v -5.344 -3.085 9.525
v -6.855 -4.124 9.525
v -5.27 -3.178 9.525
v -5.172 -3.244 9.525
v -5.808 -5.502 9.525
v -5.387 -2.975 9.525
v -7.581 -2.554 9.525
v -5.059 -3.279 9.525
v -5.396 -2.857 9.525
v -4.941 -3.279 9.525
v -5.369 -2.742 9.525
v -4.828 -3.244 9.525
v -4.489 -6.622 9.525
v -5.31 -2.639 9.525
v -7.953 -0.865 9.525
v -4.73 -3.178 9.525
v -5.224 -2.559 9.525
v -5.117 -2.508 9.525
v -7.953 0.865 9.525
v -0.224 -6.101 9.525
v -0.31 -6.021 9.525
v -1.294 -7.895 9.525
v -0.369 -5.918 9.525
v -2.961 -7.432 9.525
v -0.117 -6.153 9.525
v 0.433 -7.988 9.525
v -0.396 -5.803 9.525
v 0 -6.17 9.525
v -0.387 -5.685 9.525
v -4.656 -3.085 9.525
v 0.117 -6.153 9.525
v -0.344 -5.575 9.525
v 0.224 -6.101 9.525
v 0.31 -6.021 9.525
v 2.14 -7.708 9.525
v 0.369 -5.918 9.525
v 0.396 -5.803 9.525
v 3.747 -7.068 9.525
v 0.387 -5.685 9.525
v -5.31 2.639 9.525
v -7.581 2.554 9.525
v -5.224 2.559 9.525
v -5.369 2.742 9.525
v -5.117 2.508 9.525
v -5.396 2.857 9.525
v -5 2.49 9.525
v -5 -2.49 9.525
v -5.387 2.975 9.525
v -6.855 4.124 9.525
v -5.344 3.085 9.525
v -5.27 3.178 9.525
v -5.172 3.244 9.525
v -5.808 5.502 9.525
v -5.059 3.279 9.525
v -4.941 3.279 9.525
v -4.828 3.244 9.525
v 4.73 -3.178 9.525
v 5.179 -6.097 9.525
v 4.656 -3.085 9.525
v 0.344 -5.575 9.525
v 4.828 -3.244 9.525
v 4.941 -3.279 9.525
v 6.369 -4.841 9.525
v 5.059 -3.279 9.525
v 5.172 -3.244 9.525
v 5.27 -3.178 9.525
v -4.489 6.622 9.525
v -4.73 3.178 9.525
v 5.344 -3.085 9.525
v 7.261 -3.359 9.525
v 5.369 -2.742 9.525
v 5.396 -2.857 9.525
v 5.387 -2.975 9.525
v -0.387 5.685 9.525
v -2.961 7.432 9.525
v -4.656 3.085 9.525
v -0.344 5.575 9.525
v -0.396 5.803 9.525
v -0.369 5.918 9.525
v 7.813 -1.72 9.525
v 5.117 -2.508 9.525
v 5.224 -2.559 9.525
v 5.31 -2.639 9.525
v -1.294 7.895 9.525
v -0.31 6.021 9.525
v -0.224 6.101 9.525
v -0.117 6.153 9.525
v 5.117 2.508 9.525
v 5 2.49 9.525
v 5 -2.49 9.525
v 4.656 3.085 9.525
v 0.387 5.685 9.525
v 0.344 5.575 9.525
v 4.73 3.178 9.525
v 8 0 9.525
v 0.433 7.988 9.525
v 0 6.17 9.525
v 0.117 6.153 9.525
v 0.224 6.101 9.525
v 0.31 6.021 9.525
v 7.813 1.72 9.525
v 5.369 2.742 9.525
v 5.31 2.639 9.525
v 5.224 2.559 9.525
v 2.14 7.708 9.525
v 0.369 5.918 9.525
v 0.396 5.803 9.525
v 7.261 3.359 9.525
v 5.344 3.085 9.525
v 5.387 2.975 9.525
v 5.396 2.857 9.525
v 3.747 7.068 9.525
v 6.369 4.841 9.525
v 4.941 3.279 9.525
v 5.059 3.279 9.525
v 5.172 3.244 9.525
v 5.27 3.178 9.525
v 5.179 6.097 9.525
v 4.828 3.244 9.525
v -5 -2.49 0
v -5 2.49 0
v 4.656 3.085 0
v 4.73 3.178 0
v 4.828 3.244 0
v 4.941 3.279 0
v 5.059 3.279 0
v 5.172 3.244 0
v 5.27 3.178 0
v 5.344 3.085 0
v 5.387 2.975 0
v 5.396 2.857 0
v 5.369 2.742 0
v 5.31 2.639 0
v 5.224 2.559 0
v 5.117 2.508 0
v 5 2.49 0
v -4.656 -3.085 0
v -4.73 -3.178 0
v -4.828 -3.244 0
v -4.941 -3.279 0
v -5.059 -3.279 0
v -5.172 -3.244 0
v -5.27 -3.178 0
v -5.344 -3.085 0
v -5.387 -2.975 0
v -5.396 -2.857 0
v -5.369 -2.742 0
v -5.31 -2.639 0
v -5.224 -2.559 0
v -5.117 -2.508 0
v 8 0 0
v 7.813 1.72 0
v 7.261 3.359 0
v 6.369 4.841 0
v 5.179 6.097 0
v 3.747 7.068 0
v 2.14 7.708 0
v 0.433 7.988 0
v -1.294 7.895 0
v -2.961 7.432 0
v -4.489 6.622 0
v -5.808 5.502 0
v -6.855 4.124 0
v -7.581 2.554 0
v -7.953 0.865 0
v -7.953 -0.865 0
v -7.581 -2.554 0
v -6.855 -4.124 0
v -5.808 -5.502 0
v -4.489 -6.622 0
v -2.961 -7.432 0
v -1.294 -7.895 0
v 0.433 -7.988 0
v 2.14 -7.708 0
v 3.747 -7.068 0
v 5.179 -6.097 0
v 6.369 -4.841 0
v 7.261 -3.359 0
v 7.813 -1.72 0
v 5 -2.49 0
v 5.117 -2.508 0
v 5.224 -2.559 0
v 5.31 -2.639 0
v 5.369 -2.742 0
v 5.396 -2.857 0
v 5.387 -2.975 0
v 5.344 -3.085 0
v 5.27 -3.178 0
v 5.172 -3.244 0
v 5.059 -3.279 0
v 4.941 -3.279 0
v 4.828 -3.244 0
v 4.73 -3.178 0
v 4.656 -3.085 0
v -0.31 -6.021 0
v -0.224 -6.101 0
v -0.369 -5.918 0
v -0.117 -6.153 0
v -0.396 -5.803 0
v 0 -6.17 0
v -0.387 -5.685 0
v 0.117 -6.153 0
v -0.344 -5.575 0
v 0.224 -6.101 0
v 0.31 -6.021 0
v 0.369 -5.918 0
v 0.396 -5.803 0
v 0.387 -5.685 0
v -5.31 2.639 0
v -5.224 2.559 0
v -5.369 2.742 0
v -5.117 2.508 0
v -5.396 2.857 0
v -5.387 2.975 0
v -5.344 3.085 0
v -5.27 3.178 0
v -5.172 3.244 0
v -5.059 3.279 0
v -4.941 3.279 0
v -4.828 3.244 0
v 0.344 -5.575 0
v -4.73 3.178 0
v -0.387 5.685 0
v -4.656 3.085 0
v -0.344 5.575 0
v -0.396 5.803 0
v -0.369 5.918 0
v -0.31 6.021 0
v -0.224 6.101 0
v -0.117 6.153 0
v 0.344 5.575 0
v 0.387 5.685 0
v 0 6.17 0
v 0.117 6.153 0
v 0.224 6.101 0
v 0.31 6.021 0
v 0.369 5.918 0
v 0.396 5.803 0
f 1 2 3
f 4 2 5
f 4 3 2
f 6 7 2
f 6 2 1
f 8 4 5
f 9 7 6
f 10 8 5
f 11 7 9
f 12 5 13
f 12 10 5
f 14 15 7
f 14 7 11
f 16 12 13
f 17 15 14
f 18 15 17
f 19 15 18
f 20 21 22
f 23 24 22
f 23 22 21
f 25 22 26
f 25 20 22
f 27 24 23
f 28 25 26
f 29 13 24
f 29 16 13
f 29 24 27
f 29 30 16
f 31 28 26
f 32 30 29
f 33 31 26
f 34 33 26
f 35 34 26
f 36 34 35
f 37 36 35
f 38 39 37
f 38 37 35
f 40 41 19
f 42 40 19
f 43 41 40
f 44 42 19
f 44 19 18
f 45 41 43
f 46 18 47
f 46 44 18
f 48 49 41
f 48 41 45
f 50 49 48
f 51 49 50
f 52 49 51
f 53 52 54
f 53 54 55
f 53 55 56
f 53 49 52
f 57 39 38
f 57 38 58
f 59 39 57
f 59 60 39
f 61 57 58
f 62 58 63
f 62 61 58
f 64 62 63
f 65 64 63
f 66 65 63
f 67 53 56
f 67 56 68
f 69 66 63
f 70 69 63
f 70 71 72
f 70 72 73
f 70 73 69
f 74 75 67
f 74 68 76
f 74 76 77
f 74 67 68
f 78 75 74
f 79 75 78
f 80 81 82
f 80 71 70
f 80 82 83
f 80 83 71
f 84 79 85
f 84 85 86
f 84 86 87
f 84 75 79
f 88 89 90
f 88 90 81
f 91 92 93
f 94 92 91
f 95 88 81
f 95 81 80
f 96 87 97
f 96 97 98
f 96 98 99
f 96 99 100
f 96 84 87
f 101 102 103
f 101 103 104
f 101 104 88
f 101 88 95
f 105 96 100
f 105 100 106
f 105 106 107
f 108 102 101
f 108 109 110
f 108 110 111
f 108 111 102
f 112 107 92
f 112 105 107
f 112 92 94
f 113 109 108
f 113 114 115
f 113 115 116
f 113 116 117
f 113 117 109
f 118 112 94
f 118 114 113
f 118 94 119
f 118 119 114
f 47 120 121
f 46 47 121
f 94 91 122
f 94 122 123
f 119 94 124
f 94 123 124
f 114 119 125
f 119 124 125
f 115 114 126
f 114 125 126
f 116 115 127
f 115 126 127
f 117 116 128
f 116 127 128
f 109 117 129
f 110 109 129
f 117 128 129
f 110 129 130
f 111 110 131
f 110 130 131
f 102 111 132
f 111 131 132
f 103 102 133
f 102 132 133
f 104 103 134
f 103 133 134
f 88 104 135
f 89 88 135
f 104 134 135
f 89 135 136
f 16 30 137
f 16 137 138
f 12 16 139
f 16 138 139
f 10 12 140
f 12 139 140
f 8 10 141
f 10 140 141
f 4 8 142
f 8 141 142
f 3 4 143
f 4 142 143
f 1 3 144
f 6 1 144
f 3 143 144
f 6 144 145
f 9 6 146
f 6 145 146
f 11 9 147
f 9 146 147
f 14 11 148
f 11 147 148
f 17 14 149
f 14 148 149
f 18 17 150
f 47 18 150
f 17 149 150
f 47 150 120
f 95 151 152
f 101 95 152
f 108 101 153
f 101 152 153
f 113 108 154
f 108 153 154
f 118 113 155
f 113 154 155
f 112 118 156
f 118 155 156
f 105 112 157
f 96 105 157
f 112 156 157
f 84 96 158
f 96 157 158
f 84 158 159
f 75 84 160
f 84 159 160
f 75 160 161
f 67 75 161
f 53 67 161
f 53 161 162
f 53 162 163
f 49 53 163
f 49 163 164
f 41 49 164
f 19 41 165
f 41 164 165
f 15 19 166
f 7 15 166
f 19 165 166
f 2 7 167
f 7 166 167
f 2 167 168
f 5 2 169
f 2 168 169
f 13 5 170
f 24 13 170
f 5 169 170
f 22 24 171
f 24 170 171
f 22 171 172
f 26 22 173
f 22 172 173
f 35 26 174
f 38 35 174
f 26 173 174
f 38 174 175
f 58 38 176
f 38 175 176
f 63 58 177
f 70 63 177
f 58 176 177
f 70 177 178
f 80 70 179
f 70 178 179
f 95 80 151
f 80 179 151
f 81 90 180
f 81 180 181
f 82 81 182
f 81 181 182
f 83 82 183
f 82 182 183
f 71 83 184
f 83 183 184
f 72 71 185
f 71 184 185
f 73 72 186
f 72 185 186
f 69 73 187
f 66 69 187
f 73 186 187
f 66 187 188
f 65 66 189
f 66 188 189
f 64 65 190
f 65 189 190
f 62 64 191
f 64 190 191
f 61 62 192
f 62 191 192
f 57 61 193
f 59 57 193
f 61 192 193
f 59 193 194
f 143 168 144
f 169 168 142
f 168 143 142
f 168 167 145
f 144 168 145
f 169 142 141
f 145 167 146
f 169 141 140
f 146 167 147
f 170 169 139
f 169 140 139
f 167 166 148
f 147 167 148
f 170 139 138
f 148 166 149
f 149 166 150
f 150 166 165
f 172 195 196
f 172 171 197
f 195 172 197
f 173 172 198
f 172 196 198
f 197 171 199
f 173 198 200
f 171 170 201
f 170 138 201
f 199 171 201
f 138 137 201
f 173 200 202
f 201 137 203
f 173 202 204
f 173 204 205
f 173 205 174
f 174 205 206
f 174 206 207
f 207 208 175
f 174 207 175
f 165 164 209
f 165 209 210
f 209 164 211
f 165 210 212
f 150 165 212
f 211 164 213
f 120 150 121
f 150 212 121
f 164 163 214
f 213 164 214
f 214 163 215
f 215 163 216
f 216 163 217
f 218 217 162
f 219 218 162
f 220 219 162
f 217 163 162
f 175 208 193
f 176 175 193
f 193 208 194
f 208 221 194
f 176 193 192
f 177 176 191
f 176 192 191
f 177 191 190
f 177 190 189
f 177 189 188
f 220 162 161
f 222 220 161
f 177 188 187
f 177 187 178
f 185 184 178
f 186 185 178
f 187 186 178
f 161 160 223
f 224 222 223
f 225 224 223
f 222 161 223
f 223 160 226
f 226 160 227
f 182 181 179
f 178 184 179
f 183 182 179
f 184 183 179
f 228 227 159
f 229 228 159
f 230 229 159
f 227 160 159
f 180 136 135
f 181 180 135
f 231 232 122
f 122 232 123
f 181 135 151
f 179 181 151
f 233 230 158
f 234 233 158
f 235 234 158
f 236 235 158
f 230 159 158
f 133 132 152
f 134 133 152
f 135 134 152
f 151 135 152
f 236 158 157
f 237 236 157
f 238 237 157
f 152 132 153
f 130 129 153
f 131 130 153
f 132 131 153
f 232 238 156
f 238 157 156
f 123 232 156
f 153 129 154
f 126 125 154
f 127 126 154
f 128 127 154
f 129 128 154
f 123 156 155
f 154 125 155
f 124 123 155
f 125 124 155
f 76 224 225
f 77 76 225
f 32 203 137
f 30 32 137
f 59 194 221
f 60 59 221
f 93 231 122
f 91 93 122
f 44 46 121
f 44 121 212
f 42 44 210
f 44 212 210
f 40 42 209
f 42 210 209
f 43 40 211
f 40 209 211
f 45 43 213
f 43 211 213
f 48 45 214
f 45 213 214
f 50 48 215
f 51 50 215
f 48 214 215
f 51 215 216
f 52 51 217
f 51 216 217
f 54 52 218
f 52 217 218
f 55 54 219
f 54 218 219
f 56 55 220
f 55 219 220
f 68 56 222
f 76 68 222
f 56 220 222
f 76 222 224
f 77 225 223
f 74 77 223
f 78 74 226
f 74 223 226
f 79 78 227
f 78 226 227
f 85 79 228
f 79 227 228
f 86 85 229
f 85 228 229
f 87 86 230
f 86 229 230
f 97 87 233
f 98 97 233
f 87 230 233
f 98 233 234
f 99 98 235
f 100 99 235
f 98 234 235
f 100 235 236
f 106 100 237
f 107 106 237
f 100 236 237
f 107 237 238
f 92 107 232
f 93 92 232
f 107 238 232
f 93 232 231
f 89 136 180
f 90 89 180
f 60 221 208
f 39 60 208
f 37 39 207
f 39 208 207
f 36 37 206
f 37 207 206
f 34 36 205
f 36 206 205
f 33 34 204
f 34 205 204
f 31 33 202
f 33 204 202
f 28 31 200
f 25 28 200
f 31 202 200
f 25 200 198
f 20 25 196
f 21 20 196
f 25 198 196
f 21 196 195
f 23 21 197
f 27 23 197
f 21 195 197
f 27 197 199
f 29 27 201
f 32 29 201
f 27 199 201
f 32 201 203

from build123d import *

# Parameters (mm, degrees)
F0_R     = 8
F1_DEPTH = 9.525


# Not quite as in the source:
# - a length typed as a fraction of an inch, garbled in the dataset ("3 / 203.2 mm" for 3/8 in), is restored


with BuildPart() as f1:
    # F0 (on Top) → F1 (new body)
    with BuildSketch(Plane.XY):
        Circle(F0_R)
        with BuildLine():
            ThreePointArc((-0.3437038321, 5.5750625), (0, 6.170375), (0.3437038321, 5.5750625))
            Line((0.3437038321, 5.5750625), (4.6562938366, 3.0851875))
            ThreePointArc((4.6562938366, 3.0851875), (5.3437015009, 3.0851875), (4.9999976687, 2.489875))
            Line((4.9999976687, 2.489875), (4.9999976687, -2.489875))
            ThreePointArc((4.9999976687, -2.489875), (5.3437015009, -3.0851875), (4.6562938366, -3.0851875))
            Line((4.6562938366, -3.0851875), (0.3437038321, -5.5750625))
            ThreePointArc((0.3437038321, -5.5750625), (0, -6.170375), (-0.3437038321, -5.5750625))
            Line((-0.3437038321, -5.5750625), (-4.6562938366, -3.0851875))
            ThreePointArc((-4.6562938366, -3.0851875), (-5.3437015009, -3.0851875), (-4.9999976687, -2.489875))
            Line((-4.9999976687, -2.489875), (-4.9999976687, 2.489875))
            ThreePointArc((-4.9999976687, 2.489875), (-5.3437015009, 3.0851875), (-4.6562938366, 3.0851875))
            Line((-4.6562938366, 3.0851875), (-0.3437038321, 5.5750625))
        make_face(mode=Mode.SUBTRACT)
    extrude(amount=F1_DEPTH)


solid = f1.part
